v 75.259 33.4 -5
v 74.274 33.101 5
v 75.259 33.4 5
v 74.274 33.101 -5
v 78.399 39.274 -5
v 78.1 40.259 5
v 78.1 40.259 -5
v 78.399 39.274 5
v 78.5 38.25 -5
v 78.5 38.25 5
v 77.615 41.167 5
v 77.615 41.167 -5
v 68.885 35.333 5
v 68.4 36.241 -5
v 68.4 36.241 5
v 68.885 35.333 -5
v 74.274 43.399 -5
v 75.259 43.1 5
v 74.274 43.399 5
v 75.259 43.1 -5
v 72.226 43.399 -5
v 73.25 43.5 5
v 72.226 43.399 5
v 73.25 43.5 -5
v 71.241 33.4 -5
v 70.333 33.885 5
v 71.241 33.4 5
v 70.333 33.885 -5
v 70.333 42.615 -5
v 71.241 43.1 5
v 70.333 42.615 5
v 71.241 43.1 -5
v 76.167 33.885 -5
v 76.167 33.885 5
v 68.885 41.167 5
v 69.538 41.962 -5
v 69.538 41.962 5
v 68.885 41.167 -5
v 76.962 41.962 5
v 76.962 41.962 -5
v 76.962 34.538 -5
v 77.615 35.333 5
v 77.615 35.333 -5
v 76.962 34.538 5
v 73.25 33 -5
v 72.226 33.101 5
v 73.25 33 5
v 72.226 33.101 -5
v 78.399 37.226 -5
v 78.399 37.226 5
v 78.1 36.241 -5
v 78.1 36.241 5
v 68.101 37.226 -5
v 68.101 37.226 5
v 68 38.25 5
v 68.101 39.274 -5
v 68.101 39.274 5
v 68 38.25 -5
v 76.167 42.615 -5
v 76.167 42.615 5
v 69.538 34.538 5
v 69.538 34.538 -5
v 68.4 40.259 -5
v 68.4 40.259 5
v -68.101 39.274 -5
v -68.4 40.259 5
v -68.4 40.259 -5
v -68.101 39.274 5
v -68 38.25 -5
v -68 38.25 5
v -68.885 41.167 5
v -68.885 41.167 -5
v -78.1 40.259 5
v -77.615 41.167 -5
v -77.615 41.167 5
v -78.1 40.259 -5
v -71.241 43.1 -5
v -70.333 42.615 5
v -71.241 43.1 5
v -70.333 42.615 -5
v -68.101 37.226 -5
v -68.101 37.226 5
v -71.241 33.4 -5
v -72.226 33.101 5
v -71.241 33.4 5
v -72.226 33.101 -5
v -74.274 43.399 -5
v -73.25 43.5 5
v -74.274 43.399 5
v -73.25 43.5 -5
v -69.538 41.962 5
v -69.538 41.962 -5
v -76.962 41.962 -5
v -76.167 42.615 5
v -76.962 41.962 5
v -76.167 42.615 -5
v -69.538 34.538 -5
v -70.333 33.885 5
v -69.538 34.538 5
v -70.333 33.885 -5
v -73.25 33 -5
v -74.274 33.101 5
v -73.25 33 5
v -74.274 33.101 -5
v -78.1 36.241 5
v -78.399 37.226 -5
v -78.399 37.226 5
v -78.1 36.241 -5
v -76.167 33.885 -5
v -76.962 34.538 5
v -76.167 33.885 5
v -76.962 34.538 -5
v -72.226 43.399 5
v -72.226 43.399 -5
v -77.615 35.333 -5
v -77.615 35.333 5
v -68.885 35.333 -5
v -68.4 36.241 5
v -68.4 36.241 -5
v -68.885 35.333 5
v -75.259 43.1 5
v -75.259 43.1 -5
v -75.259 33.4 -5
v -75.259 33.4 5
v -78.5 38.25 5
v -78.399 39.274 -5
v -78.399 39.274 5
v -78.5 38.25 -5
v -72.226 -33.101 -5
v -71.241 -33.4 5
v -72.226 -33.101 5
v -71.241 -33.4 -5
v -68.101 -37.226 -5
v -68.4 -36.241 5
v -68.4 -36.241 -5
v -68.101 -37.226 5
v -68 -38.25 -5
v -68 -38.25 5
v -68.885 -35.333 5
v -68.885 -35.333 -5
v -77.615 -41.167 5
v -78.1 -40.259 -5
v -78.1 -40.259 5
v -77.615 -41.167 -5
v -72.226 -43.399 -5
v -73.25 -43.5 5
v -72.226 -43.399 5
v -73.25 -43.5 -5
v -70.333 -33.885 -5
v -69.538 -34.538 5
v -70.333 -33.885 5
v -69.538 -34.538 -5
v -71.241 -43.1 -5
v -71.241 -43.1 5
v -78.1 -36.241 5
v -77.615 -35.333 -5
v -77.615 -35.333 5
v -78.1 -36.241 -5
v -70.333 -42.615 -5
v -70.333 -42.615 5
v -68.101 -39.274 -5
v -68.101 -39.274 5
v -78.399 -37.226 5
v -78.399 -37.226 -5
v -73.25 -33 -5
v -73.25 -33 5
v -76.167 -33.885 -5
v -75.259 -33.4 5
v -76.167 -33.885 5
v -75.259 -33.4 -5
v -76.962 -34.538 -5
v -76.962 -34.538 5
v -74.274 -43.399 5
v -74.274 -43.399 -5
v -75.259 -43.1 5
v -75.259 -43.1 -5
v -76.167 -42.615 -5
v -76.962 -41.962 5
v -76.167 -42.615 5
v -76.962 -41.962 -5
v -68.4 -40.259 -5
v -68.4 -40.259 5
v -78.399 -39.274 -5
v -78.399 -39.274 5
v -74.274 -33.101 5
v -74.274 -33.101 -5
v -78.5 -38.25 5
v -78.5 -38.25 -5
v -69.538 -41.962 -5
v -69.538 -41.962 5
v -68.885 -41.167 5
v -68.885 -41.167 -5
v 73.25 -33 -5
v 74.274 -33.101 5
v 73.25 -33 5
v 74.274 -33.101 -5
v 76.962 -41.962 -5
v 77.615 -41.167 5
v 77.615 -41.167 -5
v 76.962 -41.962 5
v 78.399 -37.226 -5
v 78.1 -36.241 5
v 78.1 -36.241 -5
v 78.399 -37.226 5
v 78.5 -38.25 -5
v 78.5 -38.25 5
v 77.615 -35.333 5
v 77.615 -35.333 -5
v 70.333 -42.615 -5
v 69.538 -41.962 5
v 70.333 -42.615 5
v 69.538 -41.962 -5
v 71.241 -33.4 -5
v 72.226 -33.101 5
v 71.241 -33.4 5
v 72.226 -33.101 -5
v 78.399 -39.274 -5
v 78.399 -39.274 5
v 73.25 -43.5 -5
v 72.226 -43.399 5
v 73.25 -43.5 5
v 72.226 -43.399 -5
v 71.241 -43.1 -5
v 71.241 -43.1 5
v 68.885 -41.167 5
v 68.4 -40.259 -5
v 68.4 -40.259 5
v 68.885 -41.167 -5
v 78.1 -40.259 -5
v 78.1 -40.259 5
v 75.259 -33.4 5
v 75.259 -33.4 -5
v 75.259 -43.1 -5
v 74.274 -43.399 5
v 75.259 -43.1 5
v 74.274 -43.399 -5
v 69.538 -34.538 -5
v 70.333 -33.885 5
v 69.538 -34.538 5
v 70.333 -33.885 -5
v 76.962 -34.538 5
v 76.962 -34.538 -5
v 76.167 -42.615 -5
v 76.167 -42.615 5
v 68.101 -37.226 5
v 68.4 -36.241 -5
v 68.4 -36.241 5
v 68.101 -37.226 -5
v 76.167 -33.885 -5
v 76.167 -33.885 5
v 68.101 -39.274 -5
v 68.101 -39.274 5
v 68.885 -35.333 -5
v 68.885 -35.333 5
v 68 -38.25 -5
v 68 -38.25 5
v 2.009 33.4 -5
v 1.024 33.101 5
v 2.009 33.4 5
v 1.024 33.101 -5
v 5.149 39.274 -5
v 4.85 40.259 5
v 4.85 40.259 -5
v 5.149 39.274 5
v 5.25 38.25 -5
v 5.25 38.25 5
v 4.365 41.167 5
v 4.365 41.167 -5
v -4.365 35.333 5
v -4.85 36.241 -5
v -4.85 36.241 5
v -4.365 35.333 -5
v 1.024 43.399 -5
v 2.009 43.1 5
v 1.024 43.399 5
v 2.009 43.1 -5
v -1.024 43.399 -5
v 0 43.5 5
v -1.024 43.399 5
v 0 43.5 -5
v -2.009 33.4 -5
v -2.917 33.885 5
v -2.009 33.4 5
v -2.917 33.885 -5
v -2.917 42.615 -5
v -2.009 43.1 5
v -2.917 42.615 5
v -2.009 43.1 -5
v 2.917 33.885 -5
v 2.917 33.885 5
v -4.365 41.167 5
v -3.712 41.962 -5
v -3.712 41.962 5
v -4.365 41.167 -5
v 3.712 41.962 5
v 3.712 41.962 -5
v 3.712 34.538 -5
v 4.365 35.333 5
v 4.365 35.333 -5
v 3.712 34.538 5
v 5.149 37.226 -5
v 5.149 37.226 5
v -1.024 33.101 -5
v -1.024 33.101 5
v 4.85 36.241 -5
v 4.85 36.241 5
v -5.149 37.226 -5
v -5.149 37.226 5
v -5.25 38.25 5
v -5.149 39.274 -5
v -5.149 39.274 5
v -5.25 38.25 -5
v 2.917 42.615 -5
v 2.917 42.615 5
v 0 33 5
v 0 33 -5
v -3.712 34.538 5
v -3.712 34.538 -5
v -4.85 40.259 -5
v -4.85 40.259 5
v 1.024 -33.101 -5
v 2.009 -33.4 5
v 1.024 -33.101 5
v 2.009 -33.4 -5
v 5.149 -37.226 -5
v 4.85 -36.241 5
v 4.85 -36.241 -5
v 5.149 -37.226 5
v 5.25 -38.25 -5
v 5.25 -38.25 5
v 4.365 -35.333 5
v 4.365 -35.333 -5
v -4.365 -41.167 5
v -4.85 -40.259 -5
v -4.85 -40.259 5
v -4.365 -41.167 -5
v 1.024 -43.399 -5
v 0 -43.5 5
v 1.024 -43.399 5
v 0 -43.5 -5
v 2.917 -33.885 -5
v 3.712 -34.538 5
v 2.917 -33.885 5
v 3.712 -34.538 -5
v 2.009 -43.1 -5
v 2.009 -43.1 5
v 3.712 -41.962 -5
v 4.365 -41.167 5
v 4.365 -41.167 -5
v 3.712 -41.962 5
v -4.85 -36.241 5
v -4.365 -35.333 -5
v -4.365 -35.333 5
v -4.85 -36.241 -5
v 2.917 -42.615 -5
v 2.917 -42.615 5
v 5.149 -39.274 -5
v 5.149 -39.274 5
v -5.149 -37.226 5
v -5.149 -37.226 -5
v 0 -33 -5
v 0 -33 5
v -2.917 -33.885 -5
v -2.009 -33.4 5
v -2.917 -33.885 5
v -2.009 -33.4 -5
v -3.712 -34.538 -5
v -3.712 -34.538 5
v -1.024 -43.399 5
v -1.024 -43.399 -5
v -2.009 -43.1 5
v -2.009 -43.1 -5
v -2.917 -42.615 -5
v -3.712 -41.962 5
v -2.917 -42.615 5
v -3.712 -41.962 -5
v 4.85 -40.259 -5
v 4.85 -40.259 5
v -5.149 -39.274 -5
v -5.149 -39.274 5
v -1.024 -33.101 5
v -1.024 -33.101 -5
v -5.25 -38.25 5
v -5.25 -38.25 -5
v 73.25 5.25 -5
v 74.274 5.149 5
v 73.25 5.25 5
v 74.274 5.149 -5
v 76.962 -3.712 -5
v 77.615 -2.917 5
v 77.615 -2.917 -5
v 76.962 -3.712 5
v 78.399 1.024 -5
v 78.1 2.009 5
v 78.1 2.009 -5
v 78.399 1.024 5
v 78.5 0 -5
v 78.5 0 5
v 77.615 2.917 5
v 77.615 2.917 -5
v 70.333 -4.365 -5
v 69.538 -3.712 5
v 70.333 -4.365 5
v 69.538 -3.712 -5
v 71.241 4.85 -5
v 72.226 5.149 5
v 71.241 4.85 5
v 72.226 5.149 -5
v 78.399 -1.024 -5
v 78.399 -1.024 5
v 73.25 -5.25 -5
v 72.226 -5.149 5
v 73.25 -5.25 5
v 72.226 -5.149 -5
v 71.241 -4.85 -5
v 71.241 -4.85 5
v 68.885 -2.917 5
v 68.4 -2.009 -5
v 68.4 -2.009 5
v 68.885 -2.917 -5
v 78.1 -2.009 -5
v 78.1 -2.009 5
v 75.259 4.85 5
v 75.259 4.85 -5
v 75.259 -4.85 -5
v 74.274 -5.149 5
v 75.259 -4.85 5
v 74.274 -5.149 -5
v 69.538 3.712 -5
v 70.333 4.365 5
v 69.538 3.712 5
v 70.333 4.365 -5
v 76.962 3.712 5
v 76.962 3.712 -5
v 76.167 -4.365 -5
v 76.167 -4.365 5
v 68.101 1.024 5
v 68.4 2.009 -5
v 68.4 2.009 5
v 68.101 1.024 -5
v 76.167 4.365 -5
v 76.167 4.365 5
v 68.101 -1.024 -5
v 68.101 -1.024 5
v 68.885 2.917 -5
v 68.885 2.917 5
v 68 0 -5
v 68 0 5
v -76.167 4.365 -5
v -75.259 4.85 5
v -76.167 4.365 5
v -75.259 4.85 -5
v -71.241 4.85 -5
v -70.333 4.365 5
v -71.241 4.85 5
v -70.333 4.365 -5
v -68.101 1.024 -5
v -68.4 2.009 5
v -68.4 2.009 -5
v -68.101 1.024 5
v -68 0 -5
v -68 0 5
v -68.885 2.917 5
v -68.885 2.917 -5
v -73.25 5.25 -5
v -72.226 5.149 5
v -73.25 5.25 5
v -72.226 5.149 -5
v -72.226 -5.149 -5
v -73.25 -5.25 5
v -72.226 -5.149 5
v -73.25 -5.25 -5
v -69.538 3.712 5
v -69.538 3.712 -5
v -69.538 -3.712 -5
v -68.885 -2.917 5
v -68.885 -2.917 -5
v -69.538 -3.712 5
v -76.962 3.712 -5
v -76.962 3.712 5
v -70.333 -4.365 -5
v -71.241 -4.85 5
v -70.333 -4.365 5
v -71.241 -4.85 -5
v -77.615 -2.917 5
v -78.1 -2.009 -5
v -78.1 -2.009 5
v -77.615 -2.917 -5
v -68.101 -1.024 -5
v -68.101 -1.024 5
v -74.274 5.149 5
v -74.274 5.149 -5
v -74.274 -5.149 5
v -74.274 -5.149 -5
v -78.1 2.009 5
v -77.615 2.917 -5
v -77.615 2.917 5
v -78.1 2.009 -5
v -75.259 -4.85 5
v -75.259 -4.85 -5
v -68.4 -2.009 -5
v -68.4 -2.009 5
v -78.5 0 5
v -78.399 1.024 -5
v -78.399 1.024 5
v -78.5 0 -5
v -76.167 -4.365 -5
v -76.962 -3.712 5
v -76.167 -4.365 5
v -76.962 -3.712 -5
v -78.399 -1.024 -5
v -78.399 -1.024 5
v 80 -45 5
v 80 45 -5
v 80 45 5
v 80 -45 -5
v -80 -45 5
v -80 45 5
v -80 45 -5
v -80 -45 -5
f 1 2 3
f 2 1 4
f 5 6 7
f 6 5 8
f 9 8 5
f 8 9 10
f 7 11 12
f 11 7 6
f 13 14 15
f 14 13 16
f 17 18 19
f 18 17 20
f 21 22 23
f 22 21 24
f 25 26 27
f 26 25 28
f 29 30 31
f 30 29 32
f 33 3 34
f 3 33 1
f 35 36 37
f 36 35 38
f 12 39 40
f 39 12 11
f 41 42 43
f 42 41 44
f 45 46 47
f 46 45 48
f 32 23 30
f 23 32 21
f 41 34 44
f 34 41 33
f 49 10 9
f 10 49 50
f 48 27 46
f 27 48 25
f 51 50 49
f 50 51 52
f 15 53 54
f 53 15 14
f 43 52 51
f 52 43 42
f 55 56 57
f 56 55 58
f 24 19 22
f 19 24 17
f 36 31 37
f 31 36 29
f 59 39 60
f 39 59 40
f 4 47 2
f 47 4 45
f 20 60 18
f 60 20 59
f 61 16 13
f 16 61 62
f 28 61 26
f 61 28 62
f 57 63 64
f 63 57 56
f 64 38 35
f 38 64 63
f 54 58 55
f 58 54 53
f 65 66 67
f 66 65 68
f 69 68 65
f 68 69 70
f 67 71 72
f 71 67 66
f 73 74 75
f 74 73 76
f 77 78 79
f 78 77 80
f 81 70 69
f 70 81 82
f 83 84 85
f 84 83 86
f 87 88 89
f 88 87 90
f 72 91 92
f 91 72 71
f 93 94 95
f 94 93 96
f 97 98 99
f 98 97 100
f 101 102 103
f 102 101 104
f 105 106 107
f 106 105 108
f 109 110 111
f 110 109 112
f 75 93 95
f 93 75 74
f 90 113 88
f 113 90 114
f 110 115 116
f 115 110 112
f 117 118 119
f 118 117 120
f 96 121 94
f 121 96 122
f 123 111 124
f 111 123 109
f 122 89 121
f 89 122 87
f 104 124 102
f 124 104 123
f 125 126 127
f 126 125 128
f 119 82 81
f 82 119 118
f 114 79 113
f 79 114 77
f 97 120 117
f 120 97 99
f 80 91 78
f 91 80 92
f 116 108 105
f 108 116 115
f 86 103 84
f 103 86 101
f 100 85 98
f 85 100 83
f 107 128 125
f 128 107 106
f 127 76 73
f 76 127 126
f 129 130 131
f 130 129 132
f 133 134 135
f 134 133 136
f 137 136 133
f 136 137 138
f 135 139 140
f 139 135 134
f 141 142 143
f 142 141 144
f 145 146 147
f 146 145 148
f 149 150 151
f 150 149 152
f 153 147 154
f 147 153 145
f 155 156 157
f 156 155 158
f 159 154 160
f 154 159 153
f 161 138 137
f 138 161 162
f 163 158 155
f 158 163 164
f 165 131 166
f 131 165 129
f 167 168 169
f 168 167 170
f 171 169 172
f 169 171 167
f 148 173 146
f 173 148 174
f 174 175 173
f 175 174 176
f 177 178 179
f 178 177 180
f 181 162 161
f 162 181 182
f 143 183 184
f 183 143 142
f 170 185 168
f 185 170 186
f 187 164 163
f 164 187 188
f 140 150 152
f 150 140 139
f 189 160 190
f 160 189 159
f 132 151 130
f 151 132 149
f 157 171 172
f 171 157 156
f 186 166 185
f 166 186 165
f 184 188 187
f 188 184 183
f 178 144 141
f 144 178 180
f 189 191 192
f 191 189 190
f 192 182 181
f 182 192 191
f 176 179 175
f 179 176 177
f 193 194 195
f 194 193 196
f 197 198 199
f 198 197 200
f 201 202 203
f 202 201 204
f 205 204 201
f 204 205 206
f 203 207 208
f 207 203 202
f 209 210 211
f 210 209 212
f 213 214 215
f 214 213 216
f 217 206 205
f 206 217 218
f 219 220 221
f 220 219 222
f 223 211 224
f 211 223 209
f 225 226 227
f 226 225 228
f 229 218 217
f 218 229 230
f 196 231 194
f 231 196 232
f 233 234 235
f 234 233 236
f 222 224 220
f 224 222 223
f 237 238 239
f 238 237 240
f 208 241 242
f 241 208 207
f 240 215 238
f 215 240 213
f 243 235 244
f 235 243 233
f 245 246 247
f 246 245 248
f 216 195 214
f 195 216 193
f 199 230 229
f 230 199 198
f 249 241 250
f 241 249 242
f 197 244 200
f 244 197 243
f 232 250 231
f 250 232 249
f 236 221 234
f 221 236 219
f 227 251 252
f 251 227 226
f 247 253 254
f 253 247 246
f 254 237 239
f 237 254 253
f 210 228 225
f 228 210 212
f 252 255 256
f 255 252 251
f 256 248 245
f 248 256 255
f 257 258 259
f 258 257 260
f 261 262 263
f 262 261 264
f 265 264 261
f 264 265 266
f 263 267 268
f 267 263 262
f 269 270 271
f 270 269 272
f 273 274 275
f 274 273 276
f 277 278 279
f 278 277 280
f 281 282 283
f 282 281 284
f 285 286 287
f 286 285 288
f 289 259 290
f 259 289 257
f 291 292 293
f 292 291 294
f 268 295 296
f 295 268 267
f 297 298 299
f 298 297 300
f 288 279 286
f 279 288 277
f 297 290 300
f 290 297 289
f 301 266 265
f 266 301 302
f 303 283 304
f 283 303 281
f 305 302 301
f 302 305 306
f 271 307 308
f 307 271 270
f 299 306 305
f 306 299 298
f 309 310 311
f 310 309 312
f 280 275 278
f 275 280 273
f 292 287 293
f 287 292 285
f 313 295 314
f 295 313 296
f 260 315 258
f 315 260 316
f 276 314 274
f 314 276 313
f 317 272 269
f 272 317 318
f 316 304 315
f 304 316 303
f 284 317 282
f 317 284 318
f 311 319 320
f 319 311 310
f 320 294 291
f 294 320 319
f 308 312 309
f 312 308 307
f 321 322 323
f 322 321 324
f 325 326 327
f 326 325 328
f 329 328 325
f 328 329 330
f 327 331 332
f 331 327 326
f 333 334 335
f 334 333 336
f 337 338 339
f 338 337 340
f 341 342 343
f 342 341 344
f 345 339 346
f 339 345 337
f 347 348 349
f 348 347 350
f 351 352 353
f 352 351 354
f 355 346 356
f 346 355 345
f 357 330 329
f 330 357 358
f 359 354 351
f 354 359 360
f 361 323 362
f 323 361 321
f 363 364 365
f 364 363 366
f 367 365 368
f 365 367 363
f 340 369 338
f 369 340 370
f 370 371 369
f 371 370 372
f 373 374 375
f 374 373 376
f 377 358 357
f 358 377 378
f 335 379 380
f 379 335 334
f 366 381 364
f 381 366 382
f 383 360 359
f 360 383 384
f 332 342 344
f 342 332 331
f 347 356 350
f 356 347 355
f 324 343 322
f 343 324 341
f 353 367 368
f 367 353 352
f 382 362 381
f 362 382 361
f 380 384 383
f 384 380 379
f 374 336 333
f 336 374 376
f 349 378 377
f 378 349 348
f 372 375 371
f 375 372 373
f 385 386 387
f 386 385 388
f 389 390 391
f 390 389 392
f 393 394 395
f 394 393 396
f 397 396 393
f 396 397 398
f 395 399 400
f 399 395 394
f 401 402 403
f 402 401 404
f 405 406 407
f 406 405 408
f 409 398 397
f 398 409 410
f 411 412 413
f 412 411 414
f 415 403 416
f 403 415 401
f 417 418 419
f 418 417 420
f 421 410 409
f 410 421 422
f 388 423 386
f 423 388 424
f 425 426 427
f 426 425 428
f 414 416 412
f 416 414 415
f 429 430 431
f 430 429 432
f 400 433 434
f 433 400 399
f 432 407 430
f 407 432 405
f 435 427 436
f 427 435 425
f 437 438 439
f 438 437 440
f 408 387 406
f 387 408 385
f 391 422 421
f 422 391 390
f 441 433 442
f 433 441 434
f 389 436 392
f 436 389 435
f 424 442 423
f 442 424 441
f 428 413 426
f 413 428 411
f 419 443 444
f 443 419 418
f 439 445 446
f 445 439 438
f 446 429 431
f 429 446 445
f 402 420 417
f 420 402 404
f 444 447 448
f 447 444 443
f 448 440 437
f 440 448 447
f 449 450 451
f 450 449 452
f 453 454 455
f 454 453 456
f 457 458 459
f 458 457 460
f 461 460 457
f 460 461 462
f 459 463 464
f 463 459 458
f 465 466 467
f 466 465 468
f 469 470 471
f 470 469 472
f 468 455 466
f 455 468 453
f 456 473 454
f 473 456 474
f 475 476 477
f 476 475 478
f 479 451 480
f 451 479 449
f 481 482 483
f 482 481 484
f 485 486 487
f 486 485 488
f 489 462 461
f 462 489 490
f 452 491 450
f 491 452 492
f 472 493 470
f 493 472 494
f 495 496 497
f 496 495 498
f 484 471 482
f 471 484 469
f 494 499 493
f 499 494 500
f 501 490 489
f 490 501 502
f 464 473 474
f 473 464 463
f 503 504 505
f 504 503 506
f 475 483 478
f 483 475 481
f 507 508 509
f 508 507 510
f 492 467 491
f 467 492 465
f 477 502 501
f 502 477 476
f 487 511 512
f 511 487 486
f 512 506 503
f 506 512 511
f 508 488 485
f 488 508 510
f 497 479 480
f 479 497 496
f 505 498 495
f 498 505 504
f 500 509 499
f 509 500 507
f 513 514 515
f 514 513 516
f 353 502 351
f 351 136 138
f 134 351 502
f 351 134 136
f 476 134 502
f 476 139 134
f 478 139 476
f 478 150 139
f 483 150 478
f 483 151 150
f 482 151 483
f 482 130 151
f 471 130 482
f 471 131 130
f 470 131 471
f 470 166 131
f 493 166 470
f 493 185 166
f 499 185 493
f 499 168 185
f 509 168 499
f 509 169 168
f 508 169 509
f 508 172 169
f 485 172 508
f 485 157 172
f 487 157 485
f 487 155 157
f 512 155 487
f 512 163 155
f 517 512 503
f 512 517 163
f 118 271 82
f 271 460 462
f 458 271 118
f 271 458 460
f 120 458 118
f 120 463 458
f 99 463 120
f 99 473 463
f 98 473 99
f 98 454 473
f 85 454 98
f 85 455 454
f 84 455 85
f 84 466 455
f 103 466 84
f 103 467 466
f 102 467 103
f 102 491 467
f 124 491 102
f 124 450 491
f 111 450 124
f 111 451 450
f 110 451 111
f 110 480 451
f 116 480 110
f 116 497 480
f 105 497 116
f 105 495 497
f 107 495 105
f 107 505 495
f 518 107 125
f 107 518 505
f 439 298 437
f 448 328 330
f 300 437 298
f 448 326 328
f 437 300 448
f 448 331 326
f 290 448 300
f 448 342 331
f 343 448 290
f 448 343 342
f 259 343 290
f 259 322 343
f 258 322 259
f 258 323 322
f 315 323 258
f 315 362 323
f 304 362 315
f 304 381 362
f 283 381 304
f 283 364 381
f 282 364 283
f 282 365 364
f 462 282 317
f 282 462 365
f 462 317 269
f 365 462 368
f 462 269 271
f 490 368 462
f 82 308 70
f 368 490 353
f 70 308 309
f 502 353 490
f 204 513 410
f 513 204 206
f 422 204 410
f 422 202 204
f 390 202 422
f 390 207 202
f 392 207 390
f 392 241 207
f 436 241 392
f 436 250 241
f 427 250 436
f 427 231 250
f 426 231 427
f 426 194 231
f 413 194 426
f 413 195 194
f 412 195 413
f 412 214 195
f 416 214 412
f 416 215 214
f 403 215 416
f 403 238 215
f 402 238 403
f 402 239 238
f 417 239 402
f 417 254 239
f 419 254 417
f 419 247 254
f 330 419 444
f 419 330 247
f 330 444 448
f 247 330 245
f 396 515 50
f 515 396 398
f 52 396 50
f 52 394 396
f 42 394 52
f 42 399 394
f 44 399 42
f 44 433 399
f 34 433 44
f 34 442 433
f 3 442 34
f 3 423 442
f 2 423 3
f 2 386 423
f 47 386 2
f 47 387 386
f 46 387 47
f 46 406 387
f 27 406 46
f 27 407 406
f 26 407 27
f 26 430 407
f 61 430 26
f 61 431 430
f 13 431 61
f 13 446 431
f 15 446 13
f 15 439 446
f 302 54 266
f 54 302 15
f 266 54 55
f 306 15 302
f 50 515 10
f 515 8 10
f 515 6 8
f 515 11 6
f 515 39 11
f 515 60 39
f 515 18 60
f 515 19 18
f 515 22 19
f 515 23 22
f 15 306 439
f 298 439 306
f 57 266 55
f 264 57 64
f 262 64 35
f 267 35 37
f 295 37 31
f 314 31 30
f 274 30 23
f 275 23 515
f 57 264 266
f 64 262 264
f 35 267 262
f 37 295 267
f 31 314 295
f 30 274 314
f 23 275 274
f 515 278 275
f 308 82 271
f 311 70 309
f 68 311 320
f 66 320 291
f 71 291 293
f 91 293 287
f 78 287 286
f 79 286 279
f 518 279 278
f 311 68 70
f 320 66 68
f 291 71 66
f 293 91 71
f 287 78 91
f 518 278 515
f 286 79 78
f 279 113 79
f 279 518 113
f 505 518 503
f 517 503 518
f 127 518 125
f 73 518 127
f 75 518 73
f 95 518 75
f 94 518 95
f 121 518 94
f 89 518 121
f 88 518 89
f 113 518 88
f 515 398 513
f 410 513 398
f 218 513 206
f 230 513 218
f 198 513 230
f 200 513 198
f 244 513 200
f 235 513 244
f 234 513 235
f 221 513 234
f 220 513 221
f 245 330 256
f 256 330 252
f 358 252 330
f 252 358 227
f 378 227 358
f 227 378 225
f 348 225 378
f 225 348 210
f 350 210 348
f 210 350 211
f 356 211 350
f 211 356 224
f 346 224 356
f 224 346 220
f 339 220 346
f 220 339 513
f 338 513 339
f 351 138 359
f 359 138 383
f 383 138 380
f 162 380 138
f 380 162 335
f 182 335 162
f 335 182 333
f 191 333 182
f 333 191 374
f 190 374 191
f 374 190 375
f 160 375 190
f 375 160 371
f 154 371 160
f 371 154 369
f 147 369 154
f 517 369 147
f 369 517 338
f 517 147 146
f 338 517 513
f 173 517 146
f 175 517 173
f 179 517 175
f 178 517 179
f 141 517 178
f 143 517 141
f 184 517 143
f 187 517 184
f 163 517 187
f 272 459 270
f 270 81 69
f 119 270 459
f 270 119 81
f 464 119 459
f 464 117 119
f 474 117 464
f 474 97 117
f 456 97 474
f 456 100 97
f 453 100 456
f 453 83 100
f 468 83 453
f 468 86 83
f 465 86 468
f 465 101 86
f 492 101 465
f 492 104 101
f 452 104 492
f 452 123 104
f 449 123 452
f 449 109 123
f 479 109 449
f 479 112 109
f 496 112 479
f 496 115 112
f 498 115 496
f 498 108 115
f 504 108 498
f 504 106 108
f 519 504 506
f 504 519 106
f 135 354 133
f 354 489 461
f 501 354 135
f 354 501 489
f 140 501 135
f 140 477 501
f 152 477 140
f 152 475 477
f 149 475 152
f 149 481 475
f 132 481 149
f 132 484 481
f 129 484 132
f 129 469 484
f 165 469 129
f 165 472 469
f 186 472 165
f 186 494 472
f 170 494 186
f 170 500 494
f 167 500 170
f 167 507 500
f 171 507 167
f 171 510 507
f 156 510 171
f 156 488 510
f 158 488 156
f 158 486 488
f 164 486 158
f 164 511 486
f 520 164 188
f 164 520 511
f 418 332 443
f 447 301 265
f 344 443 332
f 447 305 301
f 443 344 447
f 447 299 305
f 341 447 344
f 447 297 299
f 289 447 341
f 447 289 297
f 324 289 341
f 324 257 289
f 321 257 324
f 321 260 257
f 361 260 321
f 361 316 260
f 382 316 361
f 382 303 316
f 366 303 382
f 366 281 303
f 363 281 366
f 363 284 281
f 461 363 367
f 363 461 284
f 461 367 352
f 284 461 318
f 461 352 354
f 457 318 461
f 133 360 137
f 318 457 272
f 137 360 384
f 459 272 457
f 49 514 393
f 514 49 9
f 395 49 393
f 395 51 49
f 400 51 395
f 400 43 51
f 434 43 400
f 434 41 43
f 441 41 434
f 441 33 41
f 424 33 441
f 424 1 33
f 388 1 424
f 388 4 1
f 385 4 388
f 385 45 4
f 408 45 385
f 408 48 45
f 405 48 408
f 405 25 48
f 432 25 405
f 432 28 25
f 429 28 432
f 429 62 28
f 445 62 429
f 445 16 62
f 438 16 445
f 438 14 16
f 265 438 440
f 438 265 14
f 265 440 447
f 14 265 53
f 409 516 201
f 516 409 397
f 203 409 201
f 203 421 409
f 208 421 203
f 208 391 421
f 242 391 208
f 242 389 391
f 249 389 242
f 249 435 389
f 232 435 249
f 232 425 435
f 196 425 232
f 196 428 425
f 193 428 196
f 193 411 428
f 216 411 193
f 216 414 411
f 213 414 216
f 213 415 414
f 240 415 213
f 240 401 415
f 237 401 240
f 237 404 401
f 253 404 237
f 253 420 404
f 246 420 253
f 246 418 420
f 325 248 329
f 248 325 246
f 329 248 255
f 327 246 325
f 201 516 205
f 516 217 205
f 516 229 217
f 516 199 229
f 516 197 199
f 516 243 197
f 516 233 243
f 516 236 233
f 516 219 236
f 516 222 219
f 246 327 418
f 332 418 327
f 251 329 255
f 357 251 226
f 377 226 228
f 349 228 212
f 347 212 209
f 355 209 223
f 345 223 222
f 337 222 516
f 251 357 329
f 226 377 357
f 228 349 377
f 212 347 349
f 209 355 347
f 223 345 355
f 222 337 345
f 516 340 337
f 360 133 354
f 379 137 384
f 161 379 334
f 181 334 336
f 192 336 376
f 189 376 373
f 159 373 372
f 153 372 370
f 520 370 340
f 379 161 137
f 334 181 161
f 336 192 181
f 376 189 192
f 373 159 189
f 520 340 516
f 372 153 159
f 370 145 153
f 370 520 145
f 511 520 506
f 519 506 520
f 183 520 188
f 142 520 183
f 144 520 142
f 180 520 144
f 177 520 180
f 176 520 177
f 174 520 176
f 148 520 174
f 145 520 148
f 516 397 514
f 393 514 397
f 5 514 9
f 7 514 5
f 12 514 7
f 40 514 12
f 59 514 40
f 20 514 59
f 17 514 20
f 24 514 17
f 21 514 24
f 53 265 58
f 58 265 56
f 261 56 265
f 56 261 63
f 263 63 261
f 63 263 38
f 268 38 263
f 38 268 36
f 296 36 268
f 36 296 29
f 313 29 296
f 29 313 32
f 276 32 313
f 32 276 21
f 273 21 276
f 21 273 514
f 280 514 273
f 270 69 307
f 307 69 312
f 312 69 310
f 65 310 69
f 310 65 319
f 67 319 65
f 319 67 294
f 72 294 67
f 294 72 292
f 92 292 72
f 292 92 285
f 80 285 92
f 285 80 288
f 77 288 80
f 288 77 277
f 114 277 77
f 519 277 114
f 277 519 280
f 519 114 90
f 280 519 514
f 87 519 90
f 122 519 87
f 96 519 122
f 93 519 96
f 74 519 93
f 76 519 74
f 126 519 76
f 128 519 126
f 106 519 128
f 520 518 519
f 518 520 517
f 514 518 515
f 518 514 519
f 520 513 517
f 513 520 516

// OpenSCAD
$fn = 32;

// ----------------------------------------------------------------------
// Corner plate 160 x 90 x 10
// 8 holes, centres taken from the edge offset
// ----------------------------------------------------------------------

// --- parameters (mm) ---
plate = [160, 90, 10];  // overall size (x, y, z)
seat_tol = 0.1;         // tolerance at the seating features
free_tol = 0.5;         // general tolerance on the free sizes
holes = 8;              // number of holes the drawing asks for
hole_d = 10.5;          // hole diameter
edge = 6.75;            // hole centre offset from the plate edge

// --- derived feature positions (mm) ---
corner_x = plate[0] / 2 - edge;  // = 73.25   corner hole X
corner_y = plate[1] / 2 - edge;  // = 38.25   corner hole Y
feature_centers = [
  [corner_x, corner_y],
  [-corner_x, corner_y],
  [-corner_x, -corner_y],
  [corner_x, -corner_y],
  [0, corner_y],
  [0, -corner_y],
  [corner_x, 0],
  [-corner_x, 0]
];   // hole centres the loop below drills

// plate outline, every hole drilled through with the same cutters
difference() {
  cube(plate, center = true);
  for (centre = feature_centers)
    translate([centre[0], centre[1], 0])
      cylinder(d = hole_d, h = plate[2] + 2, center = true);
}
